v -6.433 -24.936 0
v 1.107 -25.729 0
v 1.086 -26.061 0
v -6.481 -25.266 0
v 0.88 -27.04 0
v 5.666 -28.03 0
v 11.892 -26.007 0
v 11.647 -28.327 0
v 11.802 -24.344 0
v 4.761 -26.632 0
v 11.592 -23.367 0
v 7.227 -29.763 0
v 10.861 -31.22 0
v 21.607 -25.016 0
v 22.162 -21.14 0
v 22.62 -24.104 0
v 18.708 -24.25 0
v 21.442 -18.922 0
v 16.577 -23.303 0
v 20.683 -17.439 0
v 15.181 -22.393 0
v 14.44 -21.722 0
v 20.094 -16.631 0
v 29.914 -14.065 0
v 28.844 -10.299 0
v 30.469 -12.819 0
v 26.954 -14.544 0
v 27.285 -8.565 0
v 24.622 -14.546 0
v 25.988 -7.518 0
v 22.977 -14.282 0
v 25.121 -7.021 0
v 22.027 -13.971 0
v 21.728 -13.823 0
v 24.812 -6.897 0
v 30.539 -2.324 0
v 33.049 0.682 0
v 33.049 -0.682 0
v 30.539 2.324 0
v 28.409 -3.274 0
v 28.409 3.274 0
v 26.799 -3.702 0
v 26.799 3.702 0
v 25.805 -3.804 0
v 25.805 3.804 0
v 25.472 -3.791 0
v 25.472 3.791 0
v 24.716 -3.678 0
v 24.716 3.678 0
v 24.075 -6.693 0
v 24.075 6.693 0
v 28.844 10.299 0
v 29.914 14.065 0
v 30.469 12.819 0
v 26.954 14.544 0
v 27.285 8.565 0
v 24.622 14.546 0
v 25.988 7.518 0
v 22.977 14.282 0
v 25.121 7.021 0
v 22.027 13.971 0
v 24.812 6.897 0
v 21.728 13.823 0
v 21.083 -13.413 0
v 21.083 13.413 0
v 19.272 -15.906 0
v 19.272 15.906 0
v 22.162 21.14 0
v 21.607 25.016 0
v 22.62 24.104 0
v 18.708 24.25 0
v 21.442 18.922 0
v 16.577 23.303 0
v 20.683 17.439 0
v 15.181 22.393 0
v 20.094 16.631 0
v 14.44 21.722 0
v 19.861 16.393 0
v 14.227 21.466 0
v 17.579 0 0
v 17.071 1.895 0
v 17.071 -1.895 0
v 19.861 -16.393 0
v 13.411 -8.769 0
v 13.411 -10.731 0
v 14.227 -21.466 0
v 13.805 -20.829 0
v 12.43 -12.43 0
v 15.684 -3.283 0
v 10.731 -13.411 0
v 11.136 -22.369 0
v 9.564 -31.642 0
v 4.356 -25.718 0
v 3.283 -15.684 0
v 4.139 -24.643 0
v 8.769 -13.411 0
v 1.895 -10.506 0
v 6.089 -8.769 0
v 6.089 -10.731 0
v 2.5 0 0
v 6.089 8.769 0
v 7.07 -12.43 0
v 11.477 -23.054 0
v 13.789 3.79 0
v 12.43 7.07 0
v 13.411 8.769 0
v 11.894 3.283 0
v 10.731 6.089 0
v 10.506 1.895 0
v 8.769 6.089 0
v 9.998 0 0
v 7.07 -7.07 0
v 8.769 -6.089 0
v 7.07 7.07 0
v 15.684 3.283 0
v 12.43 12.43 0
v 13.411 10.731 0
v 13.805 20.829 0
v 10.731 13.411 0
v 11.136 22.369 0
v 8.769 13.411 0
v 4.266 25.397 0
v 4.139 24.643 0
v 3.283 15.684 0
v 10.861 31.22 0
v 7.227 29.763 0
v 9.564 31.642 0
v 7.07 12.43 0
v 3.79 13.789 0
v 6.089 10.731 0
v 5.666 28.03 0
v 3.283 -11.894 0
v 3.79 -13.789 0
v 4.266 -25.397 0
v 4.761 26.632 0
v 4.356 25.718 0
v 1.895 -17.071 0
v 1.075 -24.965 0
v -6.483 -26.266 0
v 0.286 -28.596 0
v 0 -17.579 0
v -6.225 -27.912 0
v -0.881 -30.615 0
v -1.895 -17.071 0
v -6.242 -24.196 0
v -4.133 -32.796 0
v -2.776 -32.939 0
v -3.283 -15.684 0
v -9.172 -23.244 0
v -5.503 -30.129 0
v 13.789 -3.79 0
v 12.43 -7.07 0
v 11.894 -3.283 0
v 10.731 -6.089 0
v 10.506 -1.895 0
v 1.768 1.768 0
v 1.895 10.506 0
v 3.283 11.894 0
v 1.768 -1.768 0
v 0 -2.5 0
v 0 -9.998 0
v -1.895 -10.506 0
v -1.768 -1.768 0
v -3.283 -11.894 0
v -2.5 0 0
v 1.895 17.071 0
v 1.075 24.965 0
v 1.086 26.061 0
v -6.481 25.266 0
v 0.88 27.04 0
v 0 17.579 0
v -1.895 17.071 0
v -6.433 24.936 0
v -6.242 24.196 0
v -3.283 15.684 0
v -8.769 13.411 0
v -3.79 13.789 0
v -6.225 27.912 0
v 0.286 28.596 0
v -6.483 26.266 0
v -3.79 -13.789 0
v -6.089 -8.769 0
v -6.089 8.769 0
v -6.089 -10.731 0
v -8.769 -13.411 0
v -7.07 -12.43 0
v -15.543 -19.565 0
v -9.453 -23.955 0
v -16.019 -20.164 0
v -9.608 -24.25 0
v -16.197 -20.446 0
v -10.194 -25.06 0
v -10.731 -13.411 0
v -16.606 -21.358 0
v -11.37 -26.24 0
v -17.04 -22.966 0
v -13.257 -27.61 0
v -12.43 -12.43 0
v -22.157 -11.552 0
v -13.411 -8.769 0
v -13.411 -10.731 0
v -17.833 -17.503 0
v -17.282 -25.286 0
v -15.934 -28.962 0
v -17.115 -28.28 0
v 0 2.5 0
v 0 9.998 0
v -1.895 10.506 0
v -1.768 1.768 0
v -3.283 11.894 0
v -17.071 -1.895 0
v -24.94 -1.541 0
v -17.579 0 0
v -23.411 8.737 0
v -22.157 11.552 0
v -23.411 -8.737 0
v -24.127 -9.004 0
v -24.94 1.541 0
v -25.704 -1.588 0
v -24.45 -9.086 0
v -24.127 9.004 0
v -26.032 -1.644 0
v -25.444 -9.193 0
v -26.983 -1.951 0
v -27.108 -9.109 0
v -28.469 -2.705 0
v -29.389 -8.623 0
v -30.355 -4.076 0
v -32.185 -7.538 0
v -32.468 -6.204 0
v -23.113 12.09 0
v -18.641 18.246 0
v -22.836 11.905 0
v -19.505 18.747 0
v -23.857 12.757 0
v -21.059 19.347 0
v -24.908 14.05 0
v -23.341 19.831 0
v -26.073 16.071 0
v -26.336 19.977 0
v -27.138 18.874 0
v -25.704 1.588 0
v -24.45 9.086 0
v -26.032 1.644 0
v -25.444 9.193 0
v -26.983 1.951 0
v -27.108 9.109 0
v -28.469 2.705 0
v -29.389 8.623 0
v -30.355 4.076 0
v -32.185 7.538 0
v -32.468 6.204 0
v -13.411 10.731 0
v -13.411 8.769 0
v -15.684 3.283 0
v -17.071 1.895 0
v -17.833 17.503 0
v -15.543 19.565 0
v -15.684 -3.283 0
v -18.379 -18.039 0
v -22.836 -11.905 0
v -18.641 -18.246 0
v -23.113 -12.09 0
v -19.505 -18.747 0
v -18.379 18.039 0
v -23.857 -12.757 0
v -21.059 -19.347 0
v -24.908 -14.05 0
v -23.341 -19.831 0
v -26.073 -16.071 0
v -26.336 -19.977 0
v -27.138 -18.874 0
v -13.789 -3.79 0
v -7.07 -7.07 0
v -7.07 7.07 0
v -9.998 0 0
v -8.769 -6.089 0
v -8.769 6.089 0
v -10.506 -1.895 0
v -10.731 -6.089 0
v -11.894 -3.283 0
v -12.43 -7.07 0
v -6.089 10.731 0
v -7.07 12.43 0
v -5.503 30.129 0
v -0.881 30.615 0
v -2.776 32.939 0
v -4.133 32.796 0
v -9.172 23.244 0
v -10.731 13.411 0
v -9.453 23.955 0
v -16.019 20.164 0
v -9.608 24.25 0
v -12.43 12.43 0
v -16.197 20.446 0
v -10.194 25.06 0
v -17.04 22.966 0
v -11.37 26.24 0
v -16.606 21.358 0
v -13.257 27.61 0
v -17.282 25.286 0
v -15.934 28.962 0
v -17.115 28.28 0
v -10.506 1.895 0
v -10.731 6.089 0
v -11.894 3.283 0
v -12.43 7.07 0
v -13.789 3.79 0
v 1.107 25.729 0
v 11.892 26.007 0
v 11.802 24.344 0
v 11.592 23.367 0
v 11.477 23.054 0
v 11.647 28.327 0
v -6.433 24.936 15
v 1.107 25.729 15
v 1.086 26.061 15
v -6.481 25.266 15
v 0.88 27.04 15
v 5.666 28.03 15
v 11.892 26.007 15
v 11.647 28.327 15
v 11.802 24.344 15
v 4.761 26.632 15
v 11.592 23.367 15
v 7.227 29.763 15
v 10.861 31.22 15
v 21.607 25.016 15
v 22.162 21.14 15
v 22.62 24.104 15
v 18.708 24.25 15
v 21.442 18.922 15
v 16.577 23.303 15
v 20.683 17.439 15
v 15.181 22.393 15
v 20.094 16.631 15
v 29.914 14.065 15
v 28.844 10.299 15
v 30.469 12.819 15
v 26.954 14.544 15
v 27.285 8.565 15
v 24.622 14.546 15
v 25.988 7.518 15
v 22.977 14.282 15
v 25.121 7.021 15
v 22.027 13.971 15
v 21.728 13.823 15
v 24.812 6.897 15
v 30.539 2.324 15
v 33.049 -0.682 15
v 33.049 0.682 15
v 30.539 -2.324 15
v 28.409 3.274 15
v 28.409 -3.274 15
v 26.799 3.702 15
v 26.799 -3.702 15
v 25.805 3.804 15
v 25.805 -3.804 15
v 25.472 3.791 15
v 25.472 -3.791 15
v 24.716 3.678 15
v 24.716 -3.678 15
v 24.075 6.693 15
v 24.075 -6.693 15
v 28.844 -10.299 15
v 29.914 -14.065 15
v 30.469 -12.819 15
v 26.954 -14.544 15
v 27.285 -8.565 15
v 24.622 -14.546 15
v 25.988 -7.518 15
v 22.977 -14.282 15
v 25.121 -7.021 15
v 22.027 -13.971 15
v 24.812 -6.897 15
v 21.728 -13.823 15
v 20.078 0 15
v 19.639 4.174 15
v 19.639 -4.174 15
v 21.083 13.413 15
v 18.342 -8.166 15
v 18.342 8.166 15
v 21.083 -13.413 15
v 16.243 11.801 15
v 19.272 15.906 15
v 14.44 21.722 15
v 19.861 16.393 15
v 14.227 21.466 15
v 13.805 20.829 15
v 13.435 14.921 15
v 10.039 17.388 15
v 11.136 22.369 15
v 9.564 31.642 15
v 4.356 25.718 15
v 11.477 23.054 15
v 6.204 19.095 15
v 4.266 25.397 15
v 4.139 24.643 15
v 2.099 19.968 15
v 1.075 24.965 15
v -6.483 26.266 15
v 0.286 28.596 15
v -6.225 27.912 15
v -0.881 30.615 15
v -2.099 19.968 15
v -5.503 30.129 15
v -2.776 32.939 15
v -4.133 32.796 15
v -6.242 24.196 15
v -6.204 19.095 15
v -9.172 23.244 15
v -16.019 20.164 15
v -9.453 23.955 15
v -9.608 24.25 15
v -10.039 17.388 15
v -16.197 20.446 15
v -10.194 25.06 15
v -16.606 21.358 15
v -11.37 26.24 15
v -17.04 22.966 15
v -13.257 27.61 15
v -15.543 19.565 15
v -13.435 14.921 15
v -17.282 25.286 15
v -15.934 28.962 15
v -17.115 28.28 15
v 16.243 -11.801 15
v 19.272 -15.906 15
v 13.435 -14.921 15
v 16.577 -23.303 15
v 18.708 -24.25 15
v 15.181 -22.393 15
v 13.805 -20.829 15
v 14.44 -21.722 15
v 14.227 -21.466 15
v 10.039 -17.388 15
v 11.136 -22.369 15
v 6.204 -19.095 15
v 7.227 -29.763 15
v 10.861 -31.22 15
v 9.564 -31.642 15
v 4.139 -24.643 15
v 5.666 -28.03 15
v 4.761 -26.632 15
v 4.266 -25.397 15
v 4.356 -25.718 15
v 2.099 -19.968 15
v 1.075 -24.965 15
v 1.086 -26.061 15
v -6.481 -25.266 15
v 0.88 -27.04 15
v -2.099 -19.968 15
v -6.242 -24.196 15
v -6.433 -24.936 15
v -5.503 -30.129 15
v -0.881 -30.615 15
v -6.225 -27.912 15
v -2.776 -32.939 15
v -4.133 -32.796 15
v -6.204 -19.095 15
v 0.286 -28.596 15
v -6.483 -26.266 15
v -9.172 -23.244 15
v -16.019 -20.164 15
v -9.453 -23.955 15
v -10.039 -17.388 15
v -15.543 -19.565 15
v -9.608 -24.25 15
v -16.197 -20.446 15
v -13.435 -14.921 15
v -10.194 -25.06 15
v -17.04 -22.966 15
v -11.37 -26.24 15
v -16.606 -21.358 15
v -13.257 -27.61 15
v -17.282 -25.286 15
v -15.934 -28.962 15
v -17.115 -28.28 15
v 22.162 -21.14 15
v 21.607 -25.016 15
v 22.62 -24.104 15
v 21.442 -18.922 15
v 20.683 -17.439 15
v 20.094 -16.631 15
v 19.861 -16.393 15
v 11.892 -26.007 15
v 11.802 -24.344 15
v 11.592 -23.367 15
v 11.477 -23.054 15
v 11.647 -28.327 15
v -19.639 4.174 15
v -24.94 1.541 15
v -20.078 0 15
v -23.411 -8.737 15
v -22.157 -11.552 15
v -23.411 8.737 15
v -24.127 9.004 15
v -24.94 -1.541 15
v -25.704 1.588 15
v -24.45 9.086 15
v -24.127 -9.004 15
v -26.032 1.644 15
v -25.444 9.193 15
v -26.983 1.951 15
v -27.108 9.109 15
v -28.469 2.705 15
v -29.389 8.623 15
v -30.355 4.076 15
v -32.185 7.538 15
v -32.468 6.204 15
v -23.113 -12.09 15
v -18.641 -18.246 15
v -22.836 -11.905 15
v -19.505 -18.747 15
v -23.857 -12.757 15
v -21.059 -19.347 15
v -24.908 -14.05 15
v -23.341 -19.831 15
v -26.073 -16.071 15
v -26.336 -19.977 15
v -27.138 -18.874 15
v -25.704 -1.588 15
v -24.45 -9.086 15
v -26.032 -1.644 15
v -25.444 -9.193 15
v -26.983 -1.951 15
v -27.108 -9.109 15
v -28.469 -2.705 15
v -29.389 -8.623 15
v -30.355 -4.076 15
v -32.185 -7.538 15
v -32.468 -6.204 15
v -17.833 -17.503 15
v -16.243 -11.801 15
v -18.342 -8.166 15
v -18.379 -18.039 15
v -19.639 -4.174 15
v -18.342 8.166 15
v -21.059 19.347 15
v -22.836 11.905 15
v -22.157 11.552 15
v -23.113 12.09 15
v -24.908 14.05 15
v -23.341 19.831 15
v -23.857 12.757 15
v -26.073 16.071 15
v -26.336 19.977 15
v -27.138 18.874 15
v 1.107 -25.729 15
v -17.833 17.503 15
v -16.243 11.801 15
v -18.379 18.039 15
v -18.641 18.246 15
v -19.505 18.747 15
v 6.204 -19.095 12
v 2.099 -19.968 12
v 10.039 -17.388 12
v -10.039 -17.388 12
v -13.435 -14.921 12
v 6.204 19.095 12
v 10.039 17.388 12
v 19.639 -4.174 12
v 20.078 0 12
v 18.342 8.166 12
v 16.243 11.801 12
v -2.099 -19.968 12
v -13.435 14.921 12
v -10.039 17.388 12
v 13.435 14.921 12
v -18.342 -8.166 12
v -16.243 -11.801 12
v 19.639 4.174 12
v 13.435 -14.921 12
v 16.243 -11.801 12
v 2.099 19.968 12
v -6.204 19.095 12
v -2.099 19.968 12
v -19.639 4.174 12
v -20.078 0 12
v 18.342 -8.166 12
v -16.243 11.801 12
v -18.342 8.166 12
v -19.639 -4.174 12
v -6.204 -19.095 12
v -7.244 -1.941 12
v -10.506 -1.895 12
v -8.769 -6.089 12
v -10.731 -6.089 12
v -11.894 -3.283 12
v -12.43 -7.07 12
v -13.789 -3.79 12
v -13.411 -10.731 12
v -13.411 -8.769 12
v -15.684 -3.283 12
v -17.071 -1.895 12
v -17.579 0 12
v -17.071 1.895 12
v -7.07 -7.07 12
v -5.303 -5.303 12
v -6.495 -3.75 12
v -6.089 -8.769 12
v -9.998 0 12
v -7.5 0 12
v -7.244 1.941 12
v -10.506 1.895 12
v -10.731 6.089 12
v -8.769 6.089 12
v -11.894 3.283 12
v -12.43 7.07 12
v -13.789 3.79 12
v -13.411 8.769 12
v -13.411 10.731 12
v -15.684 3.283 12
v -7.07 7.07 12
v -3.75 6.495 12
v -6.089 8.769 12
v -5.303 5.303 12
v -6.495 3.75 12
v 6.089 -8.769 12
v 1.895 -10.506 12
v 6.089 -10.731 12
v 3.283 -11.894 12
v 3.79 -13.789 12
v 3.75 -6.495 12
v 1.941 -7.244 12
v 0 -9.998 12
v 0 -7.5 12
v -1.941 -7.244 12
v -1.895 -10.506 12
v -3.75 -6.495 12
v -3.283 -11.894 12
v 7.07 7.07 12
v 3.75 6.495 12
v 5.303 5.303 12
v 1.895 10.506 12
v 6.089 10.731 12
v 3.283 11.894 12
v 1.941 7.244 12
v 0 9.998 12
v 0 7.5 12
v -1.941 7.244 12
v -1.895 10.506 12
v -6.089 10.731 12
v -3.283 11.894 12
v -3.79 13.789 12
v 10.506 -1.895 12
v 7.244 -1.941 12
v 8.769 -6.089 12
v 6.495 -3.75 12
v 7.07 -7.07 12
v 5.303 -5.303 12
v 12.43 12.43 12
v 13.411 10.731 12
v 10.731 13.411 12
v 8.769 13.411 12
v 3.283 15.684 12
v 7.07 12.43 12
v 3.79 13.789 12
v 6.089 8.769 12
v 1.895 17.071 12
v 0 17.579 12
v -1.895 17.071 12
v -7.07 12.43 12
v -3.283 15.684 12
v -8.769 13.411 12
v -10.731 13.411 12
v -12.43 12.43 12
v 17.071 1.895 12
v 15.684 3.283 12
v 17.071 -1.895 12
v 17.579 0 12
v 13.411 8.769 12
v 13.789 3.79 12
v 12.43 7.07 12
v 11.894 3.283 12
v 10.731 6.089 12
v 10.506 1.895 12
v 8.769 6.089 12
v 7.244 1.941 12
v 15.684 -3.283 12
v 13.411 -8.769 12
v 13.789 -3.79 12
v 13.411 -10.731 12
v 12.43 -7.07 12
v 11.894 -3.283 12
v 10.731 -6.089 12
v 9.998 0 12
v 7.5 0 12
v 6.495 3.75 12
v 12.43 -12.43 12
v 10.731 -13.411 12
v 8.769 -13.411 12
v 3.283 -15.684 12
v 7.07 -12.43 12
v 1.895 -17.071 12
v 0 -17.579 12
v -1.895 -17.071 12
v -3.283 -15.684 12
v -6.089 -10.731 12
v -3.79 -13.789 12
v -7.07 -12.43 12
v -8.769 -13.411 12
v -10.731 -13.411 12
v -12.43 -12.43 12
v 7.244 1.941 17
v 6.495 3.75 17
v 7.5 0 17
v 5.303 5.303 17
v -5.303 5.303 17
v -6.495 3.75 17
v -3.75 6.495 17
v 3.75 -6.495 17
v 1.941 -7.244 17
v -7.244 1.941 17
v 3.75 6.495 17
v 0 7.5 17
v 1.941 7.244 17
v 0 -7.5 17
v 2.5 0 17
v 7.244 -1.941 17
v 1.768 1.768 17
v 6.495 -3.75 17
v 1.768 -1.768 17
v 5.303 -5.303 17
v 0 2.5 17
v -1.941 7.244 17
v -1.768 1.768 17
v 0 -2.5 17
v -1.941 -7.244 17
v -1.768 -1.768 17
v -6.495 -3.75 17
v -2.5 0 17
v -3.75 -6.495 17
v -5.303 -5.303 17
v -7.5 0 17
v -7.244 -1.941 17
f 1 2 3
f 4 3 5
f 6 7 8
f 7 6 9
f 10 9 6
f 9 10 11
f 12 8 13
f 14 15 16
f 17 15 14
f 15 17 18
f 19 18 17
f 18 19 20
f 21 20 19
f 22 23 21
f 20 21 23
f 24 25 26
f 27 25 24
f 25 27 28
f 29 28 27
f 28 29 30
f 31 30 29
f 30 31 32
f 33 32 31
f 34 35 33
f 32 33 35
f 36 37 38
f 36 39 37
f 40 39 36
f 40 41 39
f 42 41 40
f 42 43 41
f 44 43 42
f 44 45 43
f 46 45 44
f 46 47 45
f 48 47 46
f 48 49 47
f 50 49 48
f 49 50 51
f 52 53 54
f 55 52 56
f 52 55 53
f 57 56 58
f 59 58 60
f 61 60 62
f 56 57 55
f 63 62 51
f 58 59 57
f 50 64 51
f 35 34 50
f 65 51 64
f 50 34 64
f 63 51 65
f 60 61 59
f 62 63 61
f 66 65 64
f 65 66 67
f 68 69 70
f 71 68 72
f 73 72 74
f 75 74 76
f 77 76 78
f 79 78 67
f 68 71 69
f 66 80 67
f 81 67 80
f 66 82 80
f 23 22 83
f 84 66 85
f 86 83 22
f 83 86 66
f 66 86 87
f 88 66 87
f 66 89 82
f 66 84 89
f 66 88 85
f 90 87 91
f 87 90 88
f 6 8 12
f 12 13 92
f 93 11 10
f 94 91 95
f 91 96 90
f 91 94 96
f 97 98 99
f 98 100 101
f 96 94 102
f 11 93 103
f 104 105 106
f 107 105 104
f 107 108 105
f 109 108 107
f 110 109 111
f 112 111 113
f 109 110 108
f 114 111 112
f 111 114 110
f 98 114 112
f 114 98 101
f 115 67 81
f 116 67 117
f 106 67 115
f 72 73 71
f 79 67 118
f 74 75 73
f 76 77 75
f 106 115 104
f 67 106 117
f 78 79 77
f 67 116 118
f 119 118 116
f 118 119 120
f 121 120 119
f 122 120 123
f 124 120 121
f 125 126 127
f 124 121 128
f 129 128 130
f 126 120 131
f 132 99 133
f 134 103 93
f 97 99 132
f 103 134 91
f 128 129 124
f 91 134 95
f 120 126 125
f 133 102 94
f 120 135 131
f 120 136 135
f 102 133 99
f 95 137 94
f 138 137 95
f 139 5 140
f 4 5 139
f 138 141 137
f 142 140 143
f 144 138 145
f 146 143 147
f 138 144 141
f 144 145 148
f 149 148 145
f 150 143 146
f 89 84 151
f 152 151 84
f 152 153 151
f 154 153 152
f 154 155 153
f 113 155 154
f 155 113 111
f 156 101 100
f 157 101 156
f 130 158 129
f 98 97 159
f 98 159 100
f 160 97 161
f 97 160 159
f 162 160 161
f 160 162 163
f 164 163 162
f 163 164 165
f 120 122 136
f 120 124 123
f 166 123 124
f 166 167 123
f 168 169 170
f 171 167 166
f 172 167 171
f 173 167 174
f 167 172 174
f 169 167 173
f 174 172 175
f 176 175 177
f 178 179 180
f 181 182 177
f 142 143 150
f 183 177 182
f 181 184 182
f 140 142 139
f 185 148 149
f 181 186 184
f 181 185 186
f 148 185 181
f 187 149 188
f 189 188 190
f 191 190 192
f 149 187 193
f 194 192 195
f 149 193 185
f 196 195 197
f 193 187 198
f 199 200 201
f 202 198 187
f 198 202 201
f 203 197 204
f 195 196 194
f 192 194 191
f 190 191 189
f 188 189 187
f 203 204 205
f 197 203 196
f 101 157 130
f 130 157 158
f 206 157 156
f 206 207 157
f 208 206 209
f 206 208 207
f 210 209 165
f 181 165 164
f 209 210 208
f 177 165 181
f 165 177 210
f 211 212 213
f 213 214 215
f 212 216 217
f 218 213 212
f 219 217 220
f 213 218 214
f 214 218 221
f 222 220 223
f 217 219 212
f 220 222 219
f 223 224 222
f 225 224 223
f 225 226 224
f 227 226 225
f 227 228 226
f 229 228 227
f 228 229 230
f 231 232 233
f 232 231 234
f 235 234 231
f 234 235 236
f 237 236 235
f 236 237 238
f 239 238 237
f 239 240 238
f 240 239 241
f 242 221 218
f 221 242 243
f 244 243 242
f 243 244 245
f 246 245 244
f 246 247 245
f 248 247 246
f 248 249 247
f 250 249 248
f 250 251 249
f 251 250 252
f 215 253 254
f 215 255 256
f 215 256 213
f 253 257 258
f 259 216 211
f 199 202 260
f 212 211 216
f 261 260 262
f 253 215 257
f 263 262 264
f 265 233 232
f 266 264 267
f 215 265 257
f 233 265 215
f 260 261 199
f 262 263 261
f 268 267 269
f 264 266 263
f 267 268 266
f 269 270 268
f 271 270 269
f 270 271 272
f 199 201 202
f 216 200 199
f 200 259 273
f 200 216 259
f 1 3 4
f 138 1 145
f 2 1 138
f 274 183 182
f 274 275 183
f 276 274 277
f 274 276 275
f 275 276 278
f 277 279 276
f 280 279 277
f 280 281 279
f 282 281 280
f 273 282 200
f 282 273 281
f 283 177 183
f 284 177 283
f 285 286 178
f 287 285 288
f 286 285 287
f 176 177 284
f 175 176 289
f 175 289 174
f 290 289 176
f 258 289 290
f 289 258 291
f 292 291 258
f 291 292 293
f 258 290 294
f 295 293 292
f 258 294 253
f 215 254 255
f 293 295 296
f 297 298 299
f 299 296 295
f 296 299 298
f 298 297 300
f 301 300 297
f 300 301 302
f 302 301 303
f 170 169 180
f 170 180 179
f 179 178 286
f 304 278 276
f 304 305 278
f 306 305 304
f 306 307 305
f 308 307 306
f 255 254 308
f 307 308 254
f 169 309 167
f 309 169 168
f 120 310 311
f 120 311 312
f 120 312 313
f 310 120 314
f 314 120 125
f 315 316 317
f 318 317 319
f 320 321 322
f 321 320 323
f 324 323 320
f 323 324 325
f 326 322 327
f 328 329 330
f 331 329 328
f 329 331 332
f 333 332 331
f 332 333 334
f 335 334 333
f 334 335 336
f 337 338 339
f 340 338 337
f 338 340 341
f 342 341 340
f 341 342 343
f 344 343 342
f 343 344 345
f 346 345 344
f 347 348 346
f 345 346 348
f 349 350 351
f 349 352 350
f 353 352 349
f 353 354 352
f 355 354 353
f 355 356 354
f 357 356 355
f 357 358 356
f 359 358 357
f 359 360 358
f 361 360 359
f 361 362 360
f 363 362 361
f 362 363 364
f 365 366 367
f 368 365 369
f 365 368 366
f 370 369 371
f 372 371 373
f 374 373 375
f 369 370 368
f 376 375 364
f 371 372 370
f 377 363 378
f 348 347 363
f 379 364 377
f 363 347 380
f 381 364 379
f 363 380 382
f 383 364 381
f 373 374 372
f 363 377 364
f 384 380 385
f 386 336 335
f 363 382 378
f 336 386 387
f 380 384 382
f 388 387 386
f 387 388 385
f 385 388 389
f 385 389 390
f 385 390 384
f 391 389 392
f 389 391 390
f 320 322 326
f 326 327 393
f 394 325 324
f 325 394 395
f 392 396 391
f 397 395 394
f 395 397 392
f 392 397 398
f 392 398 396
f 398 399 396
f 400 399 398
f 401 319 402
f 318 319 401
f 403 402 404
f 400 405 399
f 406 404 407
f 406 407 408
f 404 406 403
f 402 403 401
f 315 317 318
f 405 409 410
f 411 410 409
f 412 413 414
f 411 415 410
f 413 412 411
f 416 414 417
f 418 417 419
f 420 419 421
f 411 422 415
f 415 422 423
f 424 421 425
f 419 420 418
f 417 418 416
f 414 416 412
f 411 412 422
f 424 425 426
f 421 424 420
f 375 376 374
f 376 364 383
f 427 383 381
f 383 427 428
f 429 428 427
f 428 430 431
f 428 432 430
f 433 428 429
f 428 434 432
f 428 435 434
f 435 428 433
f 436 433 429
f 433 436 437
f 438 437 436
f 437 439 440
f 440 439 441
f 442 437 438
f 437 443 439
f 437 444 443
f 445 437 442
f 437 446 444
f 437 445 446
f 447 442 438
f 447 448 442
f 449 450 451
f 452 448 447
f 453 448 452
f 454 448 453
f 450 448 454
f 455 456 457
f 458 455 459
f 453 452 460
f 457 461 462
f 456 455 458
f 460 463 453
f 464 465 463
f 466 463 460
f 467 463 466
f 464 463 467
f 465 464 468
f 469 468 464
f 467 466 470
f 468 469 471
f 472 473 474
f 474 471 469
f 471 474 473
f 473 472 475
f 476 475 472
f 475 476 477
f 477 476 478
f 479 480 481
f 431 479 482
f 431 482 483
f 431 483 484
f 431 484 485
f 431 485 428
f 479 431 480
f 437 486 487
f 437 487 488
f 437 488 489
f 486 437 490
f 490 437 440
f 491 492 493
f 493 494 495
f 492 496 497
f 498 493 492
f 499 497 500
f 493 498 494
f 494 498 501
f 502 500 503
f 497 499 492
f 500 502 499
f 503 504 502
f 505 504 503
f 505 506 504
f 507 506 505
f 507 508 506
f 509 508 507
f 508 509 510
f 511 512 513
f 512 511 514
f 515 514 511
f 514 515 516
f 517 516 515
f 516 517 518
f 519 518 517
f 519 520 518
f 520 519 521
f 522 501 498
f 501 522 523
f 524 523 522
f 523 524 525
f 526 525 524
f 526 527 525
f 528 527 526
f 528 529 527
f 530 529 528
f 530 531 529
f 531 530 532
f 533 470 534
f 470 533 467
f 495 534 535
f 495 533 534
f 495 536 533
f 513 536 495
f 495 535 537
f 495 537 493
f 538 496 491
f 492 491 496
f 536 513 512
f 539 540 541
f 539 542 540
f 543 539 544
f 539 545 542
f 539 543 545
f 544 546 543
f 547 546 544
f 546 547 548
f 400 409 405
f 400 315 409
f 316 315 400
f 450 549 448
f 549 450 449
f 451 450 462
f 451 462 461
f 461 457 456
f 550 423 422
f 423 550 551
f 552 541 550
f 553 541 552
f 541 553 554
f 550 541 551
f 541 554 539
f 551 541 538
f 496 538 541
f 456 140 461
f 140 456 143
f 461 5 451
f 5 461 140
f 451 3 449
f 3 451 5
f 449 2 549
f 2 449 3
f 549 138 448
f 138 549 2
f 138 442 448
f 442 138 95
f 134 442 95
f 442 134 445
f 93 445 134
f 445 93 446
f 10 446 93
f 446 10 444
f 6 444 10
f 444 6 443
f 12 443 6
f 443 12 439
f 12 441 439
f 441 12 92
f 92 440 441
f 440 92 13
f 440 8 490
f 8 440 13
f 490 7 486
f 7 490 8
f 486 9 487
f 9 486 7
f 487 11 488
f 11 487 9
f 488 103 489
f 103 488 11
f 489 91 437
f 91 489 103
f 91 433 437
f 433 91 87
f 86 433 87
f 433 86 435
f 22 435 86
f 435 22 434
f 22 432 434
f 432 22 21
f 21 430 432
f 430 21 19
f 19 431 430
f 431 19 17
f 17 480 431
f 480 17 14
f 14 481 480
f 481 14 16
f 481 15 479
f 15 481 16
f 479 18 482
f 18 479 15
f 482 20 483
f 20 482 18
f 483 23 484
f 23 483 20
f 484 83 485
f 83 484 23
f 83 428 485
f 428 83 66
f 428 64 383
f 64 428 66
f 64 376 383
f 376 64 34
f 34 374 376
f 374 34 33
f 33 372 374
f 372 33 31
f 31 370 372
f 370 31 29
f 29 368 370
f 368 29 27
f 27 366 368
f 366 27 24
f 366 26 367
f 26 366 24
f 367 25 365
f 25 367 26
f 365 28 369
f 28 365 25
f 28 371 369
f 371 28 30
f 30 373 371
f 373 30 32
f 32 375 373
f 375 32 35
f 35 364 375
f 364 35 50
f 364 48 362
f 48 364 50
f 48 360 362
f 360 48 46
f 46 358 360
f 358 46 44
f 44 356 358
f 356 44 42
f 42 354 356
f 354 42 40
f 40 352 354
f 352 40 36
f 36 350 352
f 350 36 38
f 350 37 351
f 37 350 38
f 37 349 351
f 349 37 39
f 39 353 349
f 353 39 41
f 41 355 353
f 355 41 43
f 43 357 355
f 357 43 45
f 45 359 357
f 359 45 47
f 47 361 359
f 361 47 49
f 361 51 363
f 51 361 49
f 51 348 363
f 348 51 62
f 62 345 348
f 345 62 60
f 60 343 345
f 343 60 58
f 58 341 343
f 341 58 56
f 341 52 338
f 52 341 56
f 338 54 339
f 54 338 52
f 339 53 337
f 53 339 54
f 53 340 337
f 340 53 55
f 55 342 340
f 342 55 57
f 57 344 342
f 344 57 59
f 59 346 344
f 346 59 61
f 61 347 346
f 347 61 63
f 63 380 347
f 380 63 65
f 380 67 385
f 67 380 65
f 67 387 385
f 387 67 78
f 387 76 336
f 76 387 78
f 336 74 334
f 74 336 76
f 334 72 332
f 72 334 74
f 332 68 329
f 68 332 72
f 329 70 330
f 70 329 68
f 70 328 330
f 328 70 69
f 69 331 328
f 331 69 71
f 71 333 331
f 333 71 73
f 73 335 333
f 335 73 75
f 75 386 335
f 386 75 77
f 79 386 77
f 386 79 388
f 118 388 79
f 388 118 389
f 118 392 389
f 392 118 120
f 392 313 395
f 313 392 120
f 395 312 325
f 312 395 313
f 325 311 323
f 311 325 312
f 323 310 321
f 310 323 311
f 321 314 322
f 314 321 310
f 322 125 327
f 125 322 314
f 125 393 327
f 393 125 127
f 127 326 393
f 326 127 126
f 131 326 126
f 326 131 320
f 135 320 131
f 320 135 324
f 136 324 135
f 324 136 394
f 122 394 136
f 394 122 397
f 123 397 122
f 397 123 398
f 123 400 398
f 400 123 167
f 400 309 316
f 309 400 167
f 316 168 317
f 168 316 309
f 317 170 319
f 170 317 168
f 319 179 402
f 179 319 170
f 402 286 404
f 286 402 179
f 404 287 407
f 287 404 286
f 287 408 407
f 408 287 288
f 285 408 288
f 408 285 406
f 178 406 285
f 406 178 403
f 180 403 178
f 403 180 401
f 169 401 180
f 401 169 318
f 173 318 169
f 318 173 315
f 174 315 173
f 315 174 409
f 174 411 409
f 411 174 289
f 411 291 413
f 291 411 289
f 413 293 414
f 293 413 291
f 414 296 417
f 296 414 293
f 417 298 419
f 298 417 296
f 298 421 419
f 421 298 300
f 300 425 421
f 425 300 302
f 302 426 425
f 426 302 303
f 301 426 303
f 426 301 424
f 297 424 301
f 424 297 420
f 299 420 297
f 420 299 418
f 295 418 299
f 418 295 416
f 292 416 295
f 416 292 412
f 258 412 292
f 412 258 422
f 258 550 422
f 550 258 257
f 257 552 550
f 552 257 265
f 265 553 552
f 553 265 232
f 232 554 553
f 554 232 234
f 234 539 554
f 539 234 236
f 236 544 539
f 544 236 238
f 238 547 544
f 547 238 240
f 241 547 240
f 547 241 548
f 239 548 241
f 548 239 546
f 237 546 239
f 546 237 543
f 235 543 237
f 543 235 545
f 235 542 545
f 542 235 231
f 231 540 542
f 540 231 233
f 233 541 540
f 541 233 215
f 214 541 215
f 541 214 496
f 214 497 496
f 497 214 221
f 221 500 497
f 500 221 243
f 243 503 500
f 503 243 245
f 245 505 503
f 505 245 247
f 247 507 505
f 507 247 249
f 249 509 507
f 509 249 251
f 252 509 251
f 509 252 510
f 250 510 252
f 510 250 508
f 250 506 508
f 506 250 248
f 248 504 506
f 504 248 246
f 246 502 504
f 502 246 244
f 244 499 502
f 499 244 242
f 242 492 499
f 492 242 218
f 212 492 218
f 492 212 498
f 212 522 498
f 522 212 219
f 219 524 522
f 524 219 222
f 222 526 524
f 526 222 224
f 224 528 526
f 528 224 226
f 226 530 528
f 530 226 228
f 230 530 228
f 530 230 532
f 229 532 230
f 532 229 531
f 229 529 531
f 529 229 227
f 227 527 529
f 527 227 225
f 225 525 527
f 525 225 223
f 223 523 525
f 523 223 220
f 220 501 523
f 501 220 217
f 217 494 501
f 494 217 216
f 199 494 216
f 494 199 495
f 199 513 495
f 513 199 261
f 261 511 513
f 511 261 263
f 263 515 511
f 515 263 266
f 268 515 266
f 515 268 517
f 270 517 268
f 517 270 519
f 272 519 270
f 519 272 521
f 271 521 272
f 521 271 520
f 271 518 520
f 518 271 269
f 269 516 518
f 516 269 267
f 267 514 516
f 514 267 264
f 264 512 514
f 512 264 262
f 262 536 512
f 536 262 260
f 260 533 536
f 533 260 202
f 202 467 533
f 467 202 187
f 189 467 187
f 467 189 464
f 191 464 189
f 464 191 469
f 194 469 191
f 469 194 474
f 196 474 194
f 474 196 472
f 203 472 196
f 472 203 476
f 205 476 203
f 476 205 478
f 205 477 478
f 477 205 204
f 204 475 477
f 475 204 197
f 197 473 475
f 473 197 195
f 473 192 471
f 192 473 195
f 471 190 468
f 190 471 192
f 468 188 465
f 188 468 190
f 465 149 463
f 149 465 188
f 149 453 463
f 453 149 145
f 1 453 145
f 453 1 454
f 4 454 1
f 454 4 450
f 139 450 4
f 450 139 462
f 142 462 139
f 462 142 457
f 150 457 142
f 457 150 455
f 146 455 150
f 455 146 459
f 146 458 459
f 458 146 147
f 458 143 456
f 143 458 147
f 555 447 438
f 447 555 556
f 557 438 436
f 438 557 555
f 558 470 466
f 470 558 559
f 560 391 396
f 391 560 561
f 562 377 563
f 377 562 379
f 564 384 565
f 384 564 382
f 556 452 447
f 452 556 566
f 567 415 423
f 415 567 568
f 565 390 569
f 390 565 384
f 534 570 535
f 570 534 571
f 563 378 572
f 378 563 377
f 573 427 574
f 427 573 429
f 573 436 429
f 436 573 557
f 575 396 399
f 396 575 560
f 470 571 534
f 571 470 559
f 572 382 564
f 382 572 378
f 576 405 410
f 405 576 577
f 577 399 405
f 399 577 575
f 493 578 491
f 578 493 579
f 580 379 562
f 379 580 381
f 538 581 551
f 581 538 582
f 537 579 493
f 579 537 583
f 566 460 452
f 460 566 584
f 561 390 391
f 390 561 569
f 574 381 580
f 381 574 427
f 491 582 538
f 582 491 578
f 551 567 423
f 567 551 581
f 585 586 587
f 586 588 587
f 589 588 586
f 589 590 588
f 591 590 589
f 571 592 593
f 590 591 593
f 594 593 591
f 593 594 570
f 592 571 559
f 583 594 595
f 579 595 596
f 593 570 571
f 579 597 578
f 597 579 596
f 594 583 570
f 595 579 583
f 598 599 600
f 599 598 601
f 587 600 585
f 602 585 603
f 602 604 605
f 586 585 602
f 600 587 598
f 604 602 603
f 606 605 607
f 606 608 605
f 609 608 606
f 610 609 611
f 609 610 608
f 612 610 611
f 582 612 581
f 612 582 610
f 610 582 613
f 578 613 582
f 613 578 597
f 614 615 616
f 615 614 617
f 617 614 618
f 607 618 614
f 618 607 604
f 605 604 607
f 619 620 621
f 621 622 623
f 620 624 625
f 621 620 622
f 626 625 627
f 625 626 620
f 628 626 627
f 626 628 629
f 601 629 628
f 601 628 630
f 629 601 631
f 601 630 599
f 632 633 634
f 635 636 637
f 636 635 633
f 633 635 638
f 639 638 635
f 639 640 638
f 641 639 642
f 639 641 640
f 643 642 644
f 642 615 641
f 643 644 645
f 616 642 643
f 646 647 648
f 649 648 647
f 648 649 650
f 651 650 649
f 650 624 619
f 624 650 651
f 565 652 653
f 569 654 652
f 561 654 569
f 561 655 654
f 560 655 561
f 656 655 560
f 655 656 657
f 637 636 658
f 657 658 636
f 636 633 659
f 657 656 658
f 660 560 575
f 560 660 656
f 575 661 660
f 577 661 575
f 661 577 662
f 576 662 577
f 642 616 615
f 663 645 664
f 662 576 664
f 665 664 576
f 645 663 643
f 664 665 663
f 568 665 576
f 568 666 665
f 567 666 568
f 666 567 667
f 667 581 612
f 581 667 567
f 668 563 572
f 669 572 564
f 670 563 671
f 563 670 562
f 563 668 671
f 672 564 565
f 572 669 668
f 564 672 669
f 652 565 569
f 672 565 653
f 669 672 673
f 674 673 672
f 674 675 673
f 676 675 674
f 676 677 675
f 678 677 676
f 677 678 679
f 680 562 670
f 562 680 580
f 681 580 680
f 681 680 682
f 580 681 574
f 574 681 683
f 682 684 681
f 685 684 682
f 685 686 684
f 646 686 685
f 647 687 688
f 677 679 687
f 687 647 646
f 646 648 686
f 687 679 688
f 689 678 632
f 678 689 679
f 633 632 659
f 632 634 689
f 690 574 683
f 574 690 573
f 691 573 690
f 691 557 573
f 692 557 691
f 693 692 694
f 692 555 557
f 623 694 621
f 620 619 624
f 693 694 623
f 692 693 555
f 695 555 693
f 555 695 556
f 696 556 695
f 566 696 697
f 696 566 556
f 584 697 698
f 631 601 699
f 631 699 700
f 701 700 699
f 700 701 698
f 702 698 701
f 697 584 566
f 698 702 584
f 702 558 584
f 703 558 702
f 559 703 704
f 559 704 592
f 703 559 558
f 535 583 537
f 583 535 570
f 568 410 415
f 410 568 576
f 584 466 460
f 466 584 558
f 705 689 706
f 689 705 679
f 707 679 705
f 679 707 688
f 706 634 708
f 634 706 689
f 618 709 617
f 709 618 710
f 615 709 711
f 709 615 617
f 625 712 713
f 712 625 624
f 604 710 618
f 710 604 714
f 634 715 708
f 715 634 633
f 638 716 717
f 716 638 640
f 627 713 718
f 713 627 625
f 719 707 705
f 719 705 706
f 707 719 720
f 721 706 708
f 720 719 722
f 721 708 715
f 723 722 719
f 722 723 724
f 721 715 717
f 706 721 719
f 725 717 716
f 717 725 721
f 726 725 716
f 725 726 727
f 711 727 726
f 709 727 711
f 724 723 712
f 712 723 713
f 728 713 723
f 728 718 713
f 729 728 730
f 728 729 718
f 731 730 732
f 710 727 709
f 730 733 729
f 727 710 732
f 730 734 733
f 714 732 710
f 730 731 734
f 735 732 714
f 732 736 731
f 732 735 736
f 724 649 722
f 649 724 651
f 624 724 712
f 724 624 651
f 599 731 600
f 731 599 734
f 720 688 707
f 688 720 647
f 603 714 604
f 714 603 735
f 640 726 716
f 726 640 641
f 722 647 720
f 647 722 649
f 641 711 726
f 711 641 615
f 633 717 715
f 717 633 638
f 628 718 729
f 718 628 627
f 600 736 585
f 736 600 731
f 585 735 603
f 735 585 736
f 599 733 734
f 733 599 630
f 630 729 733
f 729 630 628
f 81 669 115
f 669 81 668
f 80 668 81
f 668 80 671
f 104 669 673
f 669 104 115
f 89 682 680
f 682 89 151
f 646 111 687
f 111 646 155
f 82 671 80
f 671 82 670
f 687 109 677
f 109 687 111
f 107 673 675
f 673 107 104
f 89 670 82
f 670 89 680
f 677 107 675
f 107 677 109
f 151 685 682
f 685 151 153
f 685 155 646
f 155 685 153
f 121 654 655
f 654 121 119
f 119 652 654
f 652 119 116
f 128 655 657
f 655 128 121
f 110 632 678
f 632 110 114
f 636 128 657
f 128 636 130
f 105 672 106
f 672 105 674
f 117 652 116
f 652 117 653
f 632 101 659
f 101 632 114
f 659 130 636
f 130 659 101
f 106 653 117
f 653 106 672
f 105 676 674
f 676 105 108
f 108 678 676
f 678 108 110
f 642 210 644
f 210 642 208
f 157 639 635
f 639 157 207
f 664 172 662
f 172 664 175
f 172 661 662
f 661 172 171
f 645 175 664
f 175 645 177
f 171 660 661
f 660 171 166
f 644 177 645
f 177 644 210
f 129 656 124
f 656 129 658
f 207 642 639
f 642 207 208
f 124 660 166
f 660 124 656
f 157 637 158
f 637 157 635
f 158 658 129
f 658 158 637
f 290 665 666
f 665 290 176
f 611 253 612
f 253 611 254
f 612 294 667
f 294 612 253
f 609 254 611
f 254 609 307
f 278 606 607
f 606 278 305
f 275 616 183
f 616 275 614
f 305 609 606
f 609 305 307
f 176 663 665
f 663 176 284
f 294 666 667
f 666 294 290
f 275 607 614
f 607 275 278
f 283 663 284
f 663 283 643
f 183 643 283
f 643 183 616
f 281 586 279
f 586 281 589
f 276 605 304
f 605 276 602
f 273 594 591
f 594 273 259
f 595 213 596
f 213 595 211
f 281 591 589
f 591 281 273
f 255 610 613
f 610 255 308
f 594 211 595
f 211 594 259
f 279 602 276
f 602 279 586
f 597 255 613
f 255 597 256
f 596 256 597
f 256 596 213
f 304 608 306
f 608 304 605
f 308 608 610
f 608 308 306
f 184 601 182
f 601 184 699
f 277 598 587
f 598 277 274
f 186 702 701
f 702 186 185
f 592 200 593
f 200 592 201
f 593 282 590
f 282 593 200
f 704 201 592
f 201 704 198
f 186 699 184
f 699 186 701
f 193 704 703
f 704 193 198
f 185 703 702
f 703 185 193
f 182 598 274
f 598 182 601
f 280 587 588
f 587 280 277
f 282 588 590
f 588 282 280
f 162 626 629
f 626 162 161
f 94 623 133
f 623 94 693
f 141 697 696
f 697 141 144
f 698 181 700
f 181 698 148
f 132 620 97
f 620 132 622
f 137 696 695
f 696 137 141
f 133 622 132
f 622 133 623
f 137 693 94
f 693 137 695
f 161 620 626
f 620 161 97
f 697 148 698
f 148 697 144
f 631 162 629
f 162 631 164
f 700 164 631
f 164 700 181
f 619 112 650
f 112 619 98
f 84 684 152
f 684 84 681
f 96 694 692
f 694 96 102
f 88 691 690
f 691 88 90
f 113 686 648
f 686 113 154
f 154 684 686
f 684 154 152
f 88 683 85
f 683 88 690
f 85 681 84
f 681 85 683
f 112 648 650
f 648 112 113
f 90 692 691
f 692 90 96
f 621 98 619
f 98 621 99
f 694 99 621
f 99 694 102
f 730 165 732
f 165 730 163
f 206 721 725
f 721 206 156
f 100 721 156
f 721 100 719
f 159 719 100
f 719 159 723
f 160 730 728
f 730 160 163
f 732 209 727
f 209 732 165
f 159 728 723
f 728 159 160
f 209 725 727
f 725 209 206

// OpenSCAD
// Parametric Involute Bevel and Spur Gears by GregFrost
// It is licensed under the Creative Commons - GNU GPL license.
// © 2010 by GregFrost
// http://www.thingiverse.com/thing:3575

// Simple Test:
gear (circular_pitch=700,
	gear_thickness = 12,
	rim_thickness = 15,
	hub_thickness = 17,
	circles=8);

//Complex Spur Gear Test:
//test_gears ();

// Meshing Double Helix:
//meshing_double_helix ();

// Demonstrate the backlash option for Spur gears.
//test_backlash ();

// Demonstrate how to make meshing bevel gears.
//bevel_gear_pair ();

pi=3.1415926535897932384626433832795;

//==================================================
// Bevel Gears:
// Two gears with the same cone distance, circular pitch (measured at the cone distance) 
// and pressure angle will mesh.

module bevel_gear_pair (
	gear1_teeth = 41,
	gear2_teeth = 7,
	axis_angle = 90,
	outside_circular_pitch=1000)
{
	outside_pitch_radius1 = gear1_teeth * outside_circular_pitch / 360;
	outside_pitch_radius2 = gear2_teeth * outside_circular_pitch / 360;
	pitch_apex1=outside_pitch_radius2 * sin (axis_angle) + 
		(outside_pitch_radius2 * cos (axis_angle) + outside_pitch_radius1) / tan (axis_angle);
	cone_distance = sqrt (pow (pitch_apex1, 2) + pow (outside_pitch_radius1, 2));
	pitch_apex2 = sqrt (pow (cone_distance, 2) - pow (outside_pitch_radius2, 2));
	echo ("cone_distance", cone_distance);
	pitch_angle1 = asin (outside_pitch_radius1 / cone_distance);
	pitch_angle2 = asin (outside_pitch_radius2 / cone_distance);
	echo ("pitch_angle1, pitch_angle2", pitch_angle1, pitch_angle2);
	echo ("pitch_angle1 + pitch_angle2", pitch_angle1 + pitch_angle2);

	rotate([0,0,90])
	translate ([0,0,pitch_apex1+20])
	{
		translate([0,0,-pitch_apex1])
		bevel_gear (
			number_of_teeth=gear1_teeth,
			cone_distance=cone_distance,
			pressure_angle=30,
			outside_circular_pitch=outside_circular_pitch);
	
		rotate([0,-(pitch_angle1+pitch_angle2),0])
		translate([0,0,-pitch_apex2])
		bevel_gear (
			number_of_teeth=gear2_teeth,
			cone_distance=cone_distance,
			pressure_angle=30,
			outside_circular_pitch=outside_circular_pitch);
	}
}

//Bevel Gear Finishing Options:
bevel_gear_flat = 0;
bevel_gear_back_cone = 1;

module bevel_gear (
	number_of_teeth=11,
	cone_distance=100,
	face_width=20,
	outside_circular_pitch=1000,
	pressure_angle=30,
	clearance = 0.2,
	bore_diameter=5,
	gear_thickness = 15,
	backlash = 0,
	involute_facets=0,
	finish = -1)
{
	echo ("bevel_gear",
		"teeth", number_of_teeth,
		"cone distance", cone_distance,
		face_width,
		outside_circular_pitch,
		pressure_angle,
		clearance,
		bore_diameter,
		involute_facets,
		finish);

	// Pitch diameter: Diameter of pitch circle at the fat end of the gear.
	outside_pitch_diameter  =  number_of_teeth * outside_circular_pitch / 180;
	outside_pitch_radius = outside_pitch_diameter / 2;

	// The height of the pitch apex.
	pitch_apex = sqrt (pow (cone_distance, 2) - pow (outside_pitch_radius, 2));
	pitch_angle = asin (outside_pitch_radius/cone_distance);

	echo ("Num Teeth:", number_of_teeth, " Pitch Angle:", pitch_angle);

	finish = (finish != -1) ? finish : (pitch_angle < 45) ? bevel_gear_flat : bevel_gear_back_cone;

	apex_to_apex=cone_distance / cos (pitch_angle);
	back_cone_radius = apex_to_apex * sin (pitch_angle);

	// Calculate and display the pitch angle. This is needed to determine the angle to mount two meshing cone gears.

	// Base Circle for forming the involute teeth shape.
	base_radius = back_cone_radius * cos (pressure_angle);	

	// Diametrial pitch: Number of teeth per unit length.
	pitch_diametrial = number_of_teeth / outside_pitch_diameter;

	// Addendum: Radial distance from pitch circle to outside circle.
	addendum = 1 / pitch_diametrial;
	// Outer Circle
	outer_radius = back_cone_radius + addendum;

	// Dedendum: Radial distance from pitch circle to root diameter
	dedendum = addendum + clearance;
	dedendum_angle = atan (dedendum / cone_distance);
	root_angle = pitch_angle - dedendum_angle;

	root_cone_full_radius = tan (root_angle)*apex_to_apex;
	back_cone_full_radius=apex_to_apex / tan (pitch_angle);

	back_cone_end_radius = 
		outside_pitch_radius - 
		dedendum * cos (pitch_angle) - 
		gear_thickness / tan (pitch_angle);
	back_cone_descent = dedendum * sin (pitch_angle) + gear_thickness;

	// Root diameter: Diameter of bottom of tooth spaces.
	root_radius = back_cone_radius - dedendum;

	half_tooth_thickness = outside_pitch_radius * sin (360 / (4 * number_of_teeth)) - backlash / 4;
	half_thick_angle = asin (half_tooth_thickness / back_cone_radius);

	face_cone_height = apex_to_apex-face_width / cos (pitch_angle);
	face_cone_full_radius = face_cone_height / tan (pitch_angle);
	face_cone_descent = dedendum * sin (pitch_angle);
	face_cone_end_radius = 
		outside_pitch_radius -
		face_width / sin (pitch_angle) - 
		face_cone_descent / tan (pitch_angle);

	// For the bevel_gear_flat finish option, calculate the height of a cube to select the portion of the gear that includes the full pitch face.
	bevel_gear_flat_height = pitch_apex - (cone_distance - face_width) * cos (pitch_angle);

//	translate([0,0,-pitch_apex])
	difference ()
	{
		intersection ()
		{
			union()
			{
				rotate (half_thick_angle)
				translate ([0,0,pitch_apex-apex_to_apex])
				cylinder ($fn=number_of_teeth*2, r1=root_cone_full_radius,r2=0,h=apex_to_apex);
				for (i = [1:number_of_teeth])
//				for (i = [1:1])
				{
					rotate ([0,0,i*360/number_of_teeth])
					{
						involute_bevel_gear_tooth (
							back_cone_radius = back_cone_radius,
							root_radius = root_radius,
							base_radius = base_radius,
							outer_radius = outer_radius,
							pitch_apex = pitch_apex,
							cone_distance = cone_distance,
							half_thick_angle = half_thick_angle,
							involute_facets = involute_facets);
					}
				}
			}

			if (finish == bevel_gear_back_cone)
			{
				translate ([0,0,-back_cone_descent])
				cylinder (
					$fn=number_of_teeth*2, 
					r1=back_cone_end_radius,
					r2=back_cone_full_radius*2,
					h=apex_to_apex + back_cone_descent);
			}
			else
			{
				translate ([-1.5*outside_pitch_radius,-1.5*outside_pitch_radius,0])
				cube ([3*outside_pitch_radius,
					3*outside_pitch_radius,
					bevel_gear_flat_height]);
			}
		}
		
		if (finish == bevel_gear_back_cone)
		{
			translate ([0,0,-face_cone_descent])
			cylinder (
				r1=face_cone_end_radius,
				r2=face_cone_full_radius * 2,
				h=face_cone_height + face_cone_descent+pitch_apex);
		}

		translate ([0,0,pitch_apex - apex_to_apex])
		cylinder (r=bore_diameter/2,h=apex_to_apex);
	}	
}

module involute_bevel_gear_tooth (
	back_cone_radius,
	root_radius,
	base_radius,
	outer_radius,
	pitch_apex,
	cone_distance,
	half_thick_angle,
	involute_facets)
{
//	echo ("involute_bevel_gear_tooth",
//		back_cone_radius,
//		root_radius,
//		base_radius,
//		outer_radius,
//		pitch_apex,
//		cone_distance,
//		half_thick_angle);

	min_radius = max (base_radius*2,root_radius*2);

	pitch_point = 
		involute (
			base_radius*2, 
			involute_intersect_angle (base_radius*2, back_cone_radius*2));
	pitch_angle = atan2 (pitch_point[1], pitch_point[0]);
	centre_angle = pitch_angle + half_thick_angle;

	start_angle = involute_intersect_angle (base_radius*2, min_radius);
	stop_angle = involute_intersect_angle (base_radius*2, outer_radius*2);

	res=(involute_facets!=0)?involute_facets:($fn==0)?5:$fn/4;

	translate ([0,0,pitch_apex])
	rotate ([0,-atan(back_cone_radius/cone_distance),0])
	translate ([-back_cone_radius*2,0,-cone_distance*2])
	union ()
	{
		for (i=[1:res])
		{
			assign (
				point1=
					involute (base_radius*2,start_angle+(stop_angle - start_angle)*(i-1)/res),
				point2=
					involute (base_radius*2,start_angle+(stop_angle - start_angle)*(i)/res))
			{
				assign (
					side1_point1 = rotate_point (centre_angle, point1),
					side1_point2 = rotate_point (centre_angle, point2),
					side2_point1 = mirror_point (rotate_point (centre_angle, point1)),
					side2_point2 = mirror_point (rotate_point (centre_angle, point2)))
				{
					polyhedron (
						points=[
							[back_cone_radius*2+0.1,0,cone_distance*2],
							[side1_point1[0],side1_point1[1],0],
							[side1_point2[0],side1_point2[1],0],
							[side2_point2[0],side2_point2[1],0],
							[side2_point1[0],side2_point1[1],0],
							[0.1,0,0]],
						triangles=[[0,1,2],[0,2,3],[0,3,4],[0,5,1],[1,5,2],[2,5,3],[3,5,4],[0,4,5]]);
				}
			}
		}
	}
}

module gear (
	number_of_teeth=15,
	circular_pitch=false, diametral_pitch=false,
	pressure_angle=28,
	clearance = 0.2,
	gear_thickness=5,
	rim_thickness=8,
	rim_width=5,
	hub_thickness=10,
	hub_diameter=15,
	bore_diameter=5,
	circles=0,
	backlash=0,
	twist=0,
	involute_facets=0)
{
	if (circular_pitch==false && diametral_pitch==false) 
		echo("MCAD ERROR: gear module needs either a diametral_pitch or circular_pitch");

	//Convert diametrial pitch to our native circular pitch
	circular_pitch = (circular_pitch!=false?circular_pitch:180/diametral_pitch);

	// Pitch diameter: Diameter of pitch circle.
	pitch_diameter  =  number_of_teeth * circular_pitch / 180;
	pitch_radius = pitch_diameter/2;
	echo ("Teeth:", number_of_teeth, " Pitch radius:", pitch_radius);

	// Base Circle
	base_radius = pitch_radius*cos(pressure_angle);

	// Diametrial pitch: Number of teeth per unit length.
	pitch_diametrial = number_of_teeth / pitch_diameter;

	// Addendum: Radial distance from pitch circle to outside circle.
	addendum = 1/pitch_diametrial;

	//Outer Circle
	outer_radius = pitch_radius+addendum;

	// Dedendum: Radial distance from pitch circle to root diameter
	dedendum = addendum + clearance;

	// Root diameter: Diameter of bottom of tooth spaces.
	root_radius = pitch_radius-dedendum;
	backlash_angle = backlash / pitch_radius * 180 / pi;
	half_thick_angle = (360 / number_of_teeth - backlash_angle) / 4;

	// Variables controlling the rim.
	rim_radius = root_radius - rim_width;

	// Variables controlling the circular holes in the gear.
	circle_orbit_diameter=hub_diameter/2+rim_radius;
	circle_orbit_curcumference=pi*circle_orbit_diameter;

	// Limit the circle size to 90% of the gear face.
	circle_diameter=
		min (
			0.70*circle_orbit_curcumference/circles,
			(rim_radius-hub_diameter/2)*0.9);

	difference ()
	{
		union ()
		{
			difference ()
			{
				linear_extrude (height=rim_thickness, convexity=10, twist=twist)
				gear_shape (
					number_of_teeth,
					pitch_radius = pitch_radius,
					root_radius = root_radius,
					base_radius = base_radius,
					outer_radius = outer_radius,
					half_thick_angle = half_thick_angle,
					involute_facets=involute_facets);

				if (gear_thickness < rim_thickness)
					translate ([0,0,gear_thickness])
					cylinder (r=rim_radius,h=rim_thickness-gear_thickness+1);
			}
			if (gear_thickness > rim_thickness)
				cylinder (r=rim_radius,h=gear_thickness);
			if (hub_thickness > gear_thickness)
				translate ([0,0,gear_thickness])
				cylinder (r=hub_diameter/2,h=hub_thickness-gear_thickness);
		}
		translate ([0,0,-1])
		cylinder (
			r=bore_diameter/2,
			h=2+max(rim_thickness,hub_thickness,gear_thickness));
		if (circles>0)
		{
			for(i=[0:circles-1])	
				rotate([0,0,i*360/circles])
				translate([circle_orbit_diameter/2,0,-1])
				cylinder(r=circle_diameter/2,h=max(gear_thickness,rim_thickness)+3);
		}
	}
}

module gear_shape (
	number_of_teeth,
	pitch_radius,
	root_radius,
	base_radius,
	outer_radius,
	half_thick_angle,
	involute_facets)
{
	union()
	{
		rotate (half_thick_angle) circle ($fn=number_of_teeth*2, r=root_radius);

		for (i = [1:number_of_teeth])
		{
			rotate ([0,0,i*360/number_of_teeth])
			{
				involute_gear_tooth (
					pitch_radius = pitch_radius,
					root_radius = root_radius,
					base_radius = base_radius,
					outer_radius = outer_radius,
					half_thick_angle = half_thick_angle,
					involute_facets=involute_facets);
			}
		}
	}
}

module involute_gear_tooth (
	pitch_radius,
	root_radius,
	base_radius,
	outer_radius,
	half_thick_angle,
	involute_facets)
{
	min_radius = max (base_radius,root_radius);

	pitch_point = involute (base_radius, involute_intersect_angle (base_radius, pitch_radius));
	pitch_angle = atan2 (pitch_point[1], pitch_point[0]);
	centre_angle = pitch_angle + half_thick_angle;

	start_angle = involute_intersect_angle (base_radius, min_radius);
	stop_angle = involute_intersect_angle (base_radius, outer_radius);

	res=(involute_facets!=0)?involute_facets:($fn==0)?5:$fn/4;

	union ()
	{
		for (i=[1:res])
		assign (
			point1=involute (base_radius,start_angle+(stop_angle - start_angle)*(i-1)/res),
			point2=involute (base_radius,start_angle+(stop_angle - start_angle)*i/res))
		{
			assign (
				side1_point1=rotate_point (centre_angle, point1),
				side1_point2=rotate_point (centre_angle, point2),
				side2_point1=mirror_point (rotate_point (centre_angle, point1)),
				side2_point2=mirror_point (rotate_point (centre_angle, point2)))
			{
				polygon (
					points=[[0,0],side1_point1,side1_point2,side2_point2,side2_point1],
					paths=[[0,1,2,3,4,0]]);
			}
		}
	}
}

// Mathematical Functions
//===============

// Finds the angle of the involute about the base radius at the given distance (radius) from it's center.
//source: http://www.mathhelpforum.com/math-help/geometry/136011-circle-involute-solving-y-any-given-x.html

function involute_intersect_angle (base_radius, radius) = sqrt (pow (radius/base_radius, 2) - 1) * 180 / pi;

// Calculate the involute position for a given base radius and involute angle.

function rotated_involute (rotate, base_radius, involute_angle) = 
[
	cos (rotate) * involute (base_radius, involute_angle)[0] + sin (rotate) * involute (base_radius, involute_angle)[1],
	cos (rotate) * involute (base_radius, involute_angle)[1] - sin (rotate) * involute (base_radius, involute_angle)[0]
];

function mirror_point (coord) = 
[
	coord[0], 
	-coord[1]
];

function rotate_point (rotate, coord) =
[
	cos (rotate) * coord[0] + sin (rotate) * coord[1],
	cos (rotate) * coord[1] - sin (rotate) * coord[0]
];

function involute (base_radius, involute_angle) = 
[
	base_radius*(cos (involute_angle) + involute_angle*pi/180*sin (involute_angle)),
	base_radius*(sin (involute_angle) - involute_angle*pi/180*cos (involute_angle)),
];


// Test Cases
//===============

module test_gears()
{
	translate([17,-15])
	{
		gear (number_of_teeth=17,
			circular_pitch=500,
			circles=8);
	
		rotate ([0,0,360*4/17])
		translate ([39.088888,0,0])
		{
			gear (number_of_teeth=11,
				circular_pitch=500,
				hub_diameter=0,
				rim_width=65);
			translate ([0,0,8])
			{
				gear (number_of_teeth=6,
					circular_pitch=300,
					hub_diameter=0,
					rim_width=5,
					rim_thickness=6,
					pressure_angle=31);
				rotate ([0,0,360*5/6])
				translate ([22.5,0,1])
				gear (number_of_teeth=21,
					circular_pitch=300,
					bore_diameter=2,
					hub_diameter=4,
					rim_width=1,
					hub_thickness=4,
					rim_thickness=4,
					gear_thickness=3,
					pressure_angle=31);
			}
		}

		translate ([-61.1111111,0,0])
		{
			gear (number_of_teeth=27,
				circular_pitch=500,
				circles=5,
				hub_diameter=2*8.88888889);

			translate ([0,0,10])
			{
				gear (
					number_of_teeth=14,
					circular_pitch=200,
					pressure_angle=5,
					clearance = 0.2,
					gear_thickness = 10,
					rim_thickness = 10,
					rim_width = 15,
					bore_diameter=5,
					circles=0);
				translate ([13.8888888,0,1])
				gear (
					number_of_teeth=11,
					circular_pitch=200,
					pressure_angle=5,
					clearance = 0.2,
					gear_thickness = 10,
					rim_thickness = 10,
					rim_width = 15,
					hub_thickness = 20,
					hub_diameter=2*7.222222,
					bore_diameter=5,
					circles=0);
			}
		}
	
		rotate ([0,0,360*-5/17])
		translate ([44.444444444,0,0])
		gear (number_of_teeth=15,
			circular_pitch=500,
			hub_diameter=10,
			rim_width=5,
			rim_thickness=5,
			gear_thickness=4,
			hub_thickness=6,
			circles=9);
	
		rotate ([0,0,360*-1/17])
		translate ([30.5555555,0,-1])
		gear (number_of_teeth=5,
			circular_pitch=500,
			hub_diameter=0,
			rim_width=5,
			rim_thickness=10);
	}
}

module meshing_double_helix ()
{
	test_double_helix_gear ();
	
	mirror ([0,1,0])
	translate ([58.33333333,0,0])
	test_double_helix_gear (teeth=13,circles=6);
}

module test_double_helix_gear (
	teeth=17,
	circles=8)
{
	//double helical gear
	{
		twist=200;
		height=20;
		pressure_angle=30;

		gear (number_of_teeth=teeth,
			circular_pitch=700,
			pressure_angle=pressure_angle,
			clearance = 0.2,
			gear_thickness = height/2*0.5,
			rim_thickness = height/2,
			rim_width = 5,
			hub_thickness = height/2*1.2,
			hub_diameter=15,
			bore_diameter=5,
			circles=circles,
			twist=twist/teeth);
		mirror([0,0,1])
		gear (number_of_teeth=teeth,
			circular_pitch=700,
			pressure_angle=pressure_angle,
			clearance = 0.2,
			gear_thickness = height/2,
			rim_thickness = height/2,
			rim_width = 5,
			hub_thickness = height/2,
			hub_diameter=15,
			bore_diameter=5,
			circles=circles,
			twist=twist/teeth);
	}
}

module test_backlash ()
{
	backlash = 2;
	teeth = 15;

	translate ([-29.166666,0,0])
	{
		translate ([58.3333333,0,0])
		rotate ([0,0,-360/teeth/4])
		gear (
			number_of_teeth = teeth,
			circular_pitch=700,
			gear_thickness = 12,
			rim_thickness = 15,
			rim_width = 5,
			hub_thickness = 17,
			hub_diameter=15,
			bore_diameter=5,
			backlash = 2,
			circles=8);
		
		rotate ([0,0,360/teeth/4])
		gear (
			number_of_teeth = teeth,
			circular_pitch=700,
			gear_thickness = 12,
			rim_thickness = 15,
			rim_width = 5,
			hub_thickness = 17,
			hub_diameter=15,
			bore_diameter=5,
			backlash = 2,
			circles=8);
	}

	color([0,0,128,0.5])
	translate([0,0,-5])
	cylinder ($fn=20,r=backlash / 4,h=25);
}
